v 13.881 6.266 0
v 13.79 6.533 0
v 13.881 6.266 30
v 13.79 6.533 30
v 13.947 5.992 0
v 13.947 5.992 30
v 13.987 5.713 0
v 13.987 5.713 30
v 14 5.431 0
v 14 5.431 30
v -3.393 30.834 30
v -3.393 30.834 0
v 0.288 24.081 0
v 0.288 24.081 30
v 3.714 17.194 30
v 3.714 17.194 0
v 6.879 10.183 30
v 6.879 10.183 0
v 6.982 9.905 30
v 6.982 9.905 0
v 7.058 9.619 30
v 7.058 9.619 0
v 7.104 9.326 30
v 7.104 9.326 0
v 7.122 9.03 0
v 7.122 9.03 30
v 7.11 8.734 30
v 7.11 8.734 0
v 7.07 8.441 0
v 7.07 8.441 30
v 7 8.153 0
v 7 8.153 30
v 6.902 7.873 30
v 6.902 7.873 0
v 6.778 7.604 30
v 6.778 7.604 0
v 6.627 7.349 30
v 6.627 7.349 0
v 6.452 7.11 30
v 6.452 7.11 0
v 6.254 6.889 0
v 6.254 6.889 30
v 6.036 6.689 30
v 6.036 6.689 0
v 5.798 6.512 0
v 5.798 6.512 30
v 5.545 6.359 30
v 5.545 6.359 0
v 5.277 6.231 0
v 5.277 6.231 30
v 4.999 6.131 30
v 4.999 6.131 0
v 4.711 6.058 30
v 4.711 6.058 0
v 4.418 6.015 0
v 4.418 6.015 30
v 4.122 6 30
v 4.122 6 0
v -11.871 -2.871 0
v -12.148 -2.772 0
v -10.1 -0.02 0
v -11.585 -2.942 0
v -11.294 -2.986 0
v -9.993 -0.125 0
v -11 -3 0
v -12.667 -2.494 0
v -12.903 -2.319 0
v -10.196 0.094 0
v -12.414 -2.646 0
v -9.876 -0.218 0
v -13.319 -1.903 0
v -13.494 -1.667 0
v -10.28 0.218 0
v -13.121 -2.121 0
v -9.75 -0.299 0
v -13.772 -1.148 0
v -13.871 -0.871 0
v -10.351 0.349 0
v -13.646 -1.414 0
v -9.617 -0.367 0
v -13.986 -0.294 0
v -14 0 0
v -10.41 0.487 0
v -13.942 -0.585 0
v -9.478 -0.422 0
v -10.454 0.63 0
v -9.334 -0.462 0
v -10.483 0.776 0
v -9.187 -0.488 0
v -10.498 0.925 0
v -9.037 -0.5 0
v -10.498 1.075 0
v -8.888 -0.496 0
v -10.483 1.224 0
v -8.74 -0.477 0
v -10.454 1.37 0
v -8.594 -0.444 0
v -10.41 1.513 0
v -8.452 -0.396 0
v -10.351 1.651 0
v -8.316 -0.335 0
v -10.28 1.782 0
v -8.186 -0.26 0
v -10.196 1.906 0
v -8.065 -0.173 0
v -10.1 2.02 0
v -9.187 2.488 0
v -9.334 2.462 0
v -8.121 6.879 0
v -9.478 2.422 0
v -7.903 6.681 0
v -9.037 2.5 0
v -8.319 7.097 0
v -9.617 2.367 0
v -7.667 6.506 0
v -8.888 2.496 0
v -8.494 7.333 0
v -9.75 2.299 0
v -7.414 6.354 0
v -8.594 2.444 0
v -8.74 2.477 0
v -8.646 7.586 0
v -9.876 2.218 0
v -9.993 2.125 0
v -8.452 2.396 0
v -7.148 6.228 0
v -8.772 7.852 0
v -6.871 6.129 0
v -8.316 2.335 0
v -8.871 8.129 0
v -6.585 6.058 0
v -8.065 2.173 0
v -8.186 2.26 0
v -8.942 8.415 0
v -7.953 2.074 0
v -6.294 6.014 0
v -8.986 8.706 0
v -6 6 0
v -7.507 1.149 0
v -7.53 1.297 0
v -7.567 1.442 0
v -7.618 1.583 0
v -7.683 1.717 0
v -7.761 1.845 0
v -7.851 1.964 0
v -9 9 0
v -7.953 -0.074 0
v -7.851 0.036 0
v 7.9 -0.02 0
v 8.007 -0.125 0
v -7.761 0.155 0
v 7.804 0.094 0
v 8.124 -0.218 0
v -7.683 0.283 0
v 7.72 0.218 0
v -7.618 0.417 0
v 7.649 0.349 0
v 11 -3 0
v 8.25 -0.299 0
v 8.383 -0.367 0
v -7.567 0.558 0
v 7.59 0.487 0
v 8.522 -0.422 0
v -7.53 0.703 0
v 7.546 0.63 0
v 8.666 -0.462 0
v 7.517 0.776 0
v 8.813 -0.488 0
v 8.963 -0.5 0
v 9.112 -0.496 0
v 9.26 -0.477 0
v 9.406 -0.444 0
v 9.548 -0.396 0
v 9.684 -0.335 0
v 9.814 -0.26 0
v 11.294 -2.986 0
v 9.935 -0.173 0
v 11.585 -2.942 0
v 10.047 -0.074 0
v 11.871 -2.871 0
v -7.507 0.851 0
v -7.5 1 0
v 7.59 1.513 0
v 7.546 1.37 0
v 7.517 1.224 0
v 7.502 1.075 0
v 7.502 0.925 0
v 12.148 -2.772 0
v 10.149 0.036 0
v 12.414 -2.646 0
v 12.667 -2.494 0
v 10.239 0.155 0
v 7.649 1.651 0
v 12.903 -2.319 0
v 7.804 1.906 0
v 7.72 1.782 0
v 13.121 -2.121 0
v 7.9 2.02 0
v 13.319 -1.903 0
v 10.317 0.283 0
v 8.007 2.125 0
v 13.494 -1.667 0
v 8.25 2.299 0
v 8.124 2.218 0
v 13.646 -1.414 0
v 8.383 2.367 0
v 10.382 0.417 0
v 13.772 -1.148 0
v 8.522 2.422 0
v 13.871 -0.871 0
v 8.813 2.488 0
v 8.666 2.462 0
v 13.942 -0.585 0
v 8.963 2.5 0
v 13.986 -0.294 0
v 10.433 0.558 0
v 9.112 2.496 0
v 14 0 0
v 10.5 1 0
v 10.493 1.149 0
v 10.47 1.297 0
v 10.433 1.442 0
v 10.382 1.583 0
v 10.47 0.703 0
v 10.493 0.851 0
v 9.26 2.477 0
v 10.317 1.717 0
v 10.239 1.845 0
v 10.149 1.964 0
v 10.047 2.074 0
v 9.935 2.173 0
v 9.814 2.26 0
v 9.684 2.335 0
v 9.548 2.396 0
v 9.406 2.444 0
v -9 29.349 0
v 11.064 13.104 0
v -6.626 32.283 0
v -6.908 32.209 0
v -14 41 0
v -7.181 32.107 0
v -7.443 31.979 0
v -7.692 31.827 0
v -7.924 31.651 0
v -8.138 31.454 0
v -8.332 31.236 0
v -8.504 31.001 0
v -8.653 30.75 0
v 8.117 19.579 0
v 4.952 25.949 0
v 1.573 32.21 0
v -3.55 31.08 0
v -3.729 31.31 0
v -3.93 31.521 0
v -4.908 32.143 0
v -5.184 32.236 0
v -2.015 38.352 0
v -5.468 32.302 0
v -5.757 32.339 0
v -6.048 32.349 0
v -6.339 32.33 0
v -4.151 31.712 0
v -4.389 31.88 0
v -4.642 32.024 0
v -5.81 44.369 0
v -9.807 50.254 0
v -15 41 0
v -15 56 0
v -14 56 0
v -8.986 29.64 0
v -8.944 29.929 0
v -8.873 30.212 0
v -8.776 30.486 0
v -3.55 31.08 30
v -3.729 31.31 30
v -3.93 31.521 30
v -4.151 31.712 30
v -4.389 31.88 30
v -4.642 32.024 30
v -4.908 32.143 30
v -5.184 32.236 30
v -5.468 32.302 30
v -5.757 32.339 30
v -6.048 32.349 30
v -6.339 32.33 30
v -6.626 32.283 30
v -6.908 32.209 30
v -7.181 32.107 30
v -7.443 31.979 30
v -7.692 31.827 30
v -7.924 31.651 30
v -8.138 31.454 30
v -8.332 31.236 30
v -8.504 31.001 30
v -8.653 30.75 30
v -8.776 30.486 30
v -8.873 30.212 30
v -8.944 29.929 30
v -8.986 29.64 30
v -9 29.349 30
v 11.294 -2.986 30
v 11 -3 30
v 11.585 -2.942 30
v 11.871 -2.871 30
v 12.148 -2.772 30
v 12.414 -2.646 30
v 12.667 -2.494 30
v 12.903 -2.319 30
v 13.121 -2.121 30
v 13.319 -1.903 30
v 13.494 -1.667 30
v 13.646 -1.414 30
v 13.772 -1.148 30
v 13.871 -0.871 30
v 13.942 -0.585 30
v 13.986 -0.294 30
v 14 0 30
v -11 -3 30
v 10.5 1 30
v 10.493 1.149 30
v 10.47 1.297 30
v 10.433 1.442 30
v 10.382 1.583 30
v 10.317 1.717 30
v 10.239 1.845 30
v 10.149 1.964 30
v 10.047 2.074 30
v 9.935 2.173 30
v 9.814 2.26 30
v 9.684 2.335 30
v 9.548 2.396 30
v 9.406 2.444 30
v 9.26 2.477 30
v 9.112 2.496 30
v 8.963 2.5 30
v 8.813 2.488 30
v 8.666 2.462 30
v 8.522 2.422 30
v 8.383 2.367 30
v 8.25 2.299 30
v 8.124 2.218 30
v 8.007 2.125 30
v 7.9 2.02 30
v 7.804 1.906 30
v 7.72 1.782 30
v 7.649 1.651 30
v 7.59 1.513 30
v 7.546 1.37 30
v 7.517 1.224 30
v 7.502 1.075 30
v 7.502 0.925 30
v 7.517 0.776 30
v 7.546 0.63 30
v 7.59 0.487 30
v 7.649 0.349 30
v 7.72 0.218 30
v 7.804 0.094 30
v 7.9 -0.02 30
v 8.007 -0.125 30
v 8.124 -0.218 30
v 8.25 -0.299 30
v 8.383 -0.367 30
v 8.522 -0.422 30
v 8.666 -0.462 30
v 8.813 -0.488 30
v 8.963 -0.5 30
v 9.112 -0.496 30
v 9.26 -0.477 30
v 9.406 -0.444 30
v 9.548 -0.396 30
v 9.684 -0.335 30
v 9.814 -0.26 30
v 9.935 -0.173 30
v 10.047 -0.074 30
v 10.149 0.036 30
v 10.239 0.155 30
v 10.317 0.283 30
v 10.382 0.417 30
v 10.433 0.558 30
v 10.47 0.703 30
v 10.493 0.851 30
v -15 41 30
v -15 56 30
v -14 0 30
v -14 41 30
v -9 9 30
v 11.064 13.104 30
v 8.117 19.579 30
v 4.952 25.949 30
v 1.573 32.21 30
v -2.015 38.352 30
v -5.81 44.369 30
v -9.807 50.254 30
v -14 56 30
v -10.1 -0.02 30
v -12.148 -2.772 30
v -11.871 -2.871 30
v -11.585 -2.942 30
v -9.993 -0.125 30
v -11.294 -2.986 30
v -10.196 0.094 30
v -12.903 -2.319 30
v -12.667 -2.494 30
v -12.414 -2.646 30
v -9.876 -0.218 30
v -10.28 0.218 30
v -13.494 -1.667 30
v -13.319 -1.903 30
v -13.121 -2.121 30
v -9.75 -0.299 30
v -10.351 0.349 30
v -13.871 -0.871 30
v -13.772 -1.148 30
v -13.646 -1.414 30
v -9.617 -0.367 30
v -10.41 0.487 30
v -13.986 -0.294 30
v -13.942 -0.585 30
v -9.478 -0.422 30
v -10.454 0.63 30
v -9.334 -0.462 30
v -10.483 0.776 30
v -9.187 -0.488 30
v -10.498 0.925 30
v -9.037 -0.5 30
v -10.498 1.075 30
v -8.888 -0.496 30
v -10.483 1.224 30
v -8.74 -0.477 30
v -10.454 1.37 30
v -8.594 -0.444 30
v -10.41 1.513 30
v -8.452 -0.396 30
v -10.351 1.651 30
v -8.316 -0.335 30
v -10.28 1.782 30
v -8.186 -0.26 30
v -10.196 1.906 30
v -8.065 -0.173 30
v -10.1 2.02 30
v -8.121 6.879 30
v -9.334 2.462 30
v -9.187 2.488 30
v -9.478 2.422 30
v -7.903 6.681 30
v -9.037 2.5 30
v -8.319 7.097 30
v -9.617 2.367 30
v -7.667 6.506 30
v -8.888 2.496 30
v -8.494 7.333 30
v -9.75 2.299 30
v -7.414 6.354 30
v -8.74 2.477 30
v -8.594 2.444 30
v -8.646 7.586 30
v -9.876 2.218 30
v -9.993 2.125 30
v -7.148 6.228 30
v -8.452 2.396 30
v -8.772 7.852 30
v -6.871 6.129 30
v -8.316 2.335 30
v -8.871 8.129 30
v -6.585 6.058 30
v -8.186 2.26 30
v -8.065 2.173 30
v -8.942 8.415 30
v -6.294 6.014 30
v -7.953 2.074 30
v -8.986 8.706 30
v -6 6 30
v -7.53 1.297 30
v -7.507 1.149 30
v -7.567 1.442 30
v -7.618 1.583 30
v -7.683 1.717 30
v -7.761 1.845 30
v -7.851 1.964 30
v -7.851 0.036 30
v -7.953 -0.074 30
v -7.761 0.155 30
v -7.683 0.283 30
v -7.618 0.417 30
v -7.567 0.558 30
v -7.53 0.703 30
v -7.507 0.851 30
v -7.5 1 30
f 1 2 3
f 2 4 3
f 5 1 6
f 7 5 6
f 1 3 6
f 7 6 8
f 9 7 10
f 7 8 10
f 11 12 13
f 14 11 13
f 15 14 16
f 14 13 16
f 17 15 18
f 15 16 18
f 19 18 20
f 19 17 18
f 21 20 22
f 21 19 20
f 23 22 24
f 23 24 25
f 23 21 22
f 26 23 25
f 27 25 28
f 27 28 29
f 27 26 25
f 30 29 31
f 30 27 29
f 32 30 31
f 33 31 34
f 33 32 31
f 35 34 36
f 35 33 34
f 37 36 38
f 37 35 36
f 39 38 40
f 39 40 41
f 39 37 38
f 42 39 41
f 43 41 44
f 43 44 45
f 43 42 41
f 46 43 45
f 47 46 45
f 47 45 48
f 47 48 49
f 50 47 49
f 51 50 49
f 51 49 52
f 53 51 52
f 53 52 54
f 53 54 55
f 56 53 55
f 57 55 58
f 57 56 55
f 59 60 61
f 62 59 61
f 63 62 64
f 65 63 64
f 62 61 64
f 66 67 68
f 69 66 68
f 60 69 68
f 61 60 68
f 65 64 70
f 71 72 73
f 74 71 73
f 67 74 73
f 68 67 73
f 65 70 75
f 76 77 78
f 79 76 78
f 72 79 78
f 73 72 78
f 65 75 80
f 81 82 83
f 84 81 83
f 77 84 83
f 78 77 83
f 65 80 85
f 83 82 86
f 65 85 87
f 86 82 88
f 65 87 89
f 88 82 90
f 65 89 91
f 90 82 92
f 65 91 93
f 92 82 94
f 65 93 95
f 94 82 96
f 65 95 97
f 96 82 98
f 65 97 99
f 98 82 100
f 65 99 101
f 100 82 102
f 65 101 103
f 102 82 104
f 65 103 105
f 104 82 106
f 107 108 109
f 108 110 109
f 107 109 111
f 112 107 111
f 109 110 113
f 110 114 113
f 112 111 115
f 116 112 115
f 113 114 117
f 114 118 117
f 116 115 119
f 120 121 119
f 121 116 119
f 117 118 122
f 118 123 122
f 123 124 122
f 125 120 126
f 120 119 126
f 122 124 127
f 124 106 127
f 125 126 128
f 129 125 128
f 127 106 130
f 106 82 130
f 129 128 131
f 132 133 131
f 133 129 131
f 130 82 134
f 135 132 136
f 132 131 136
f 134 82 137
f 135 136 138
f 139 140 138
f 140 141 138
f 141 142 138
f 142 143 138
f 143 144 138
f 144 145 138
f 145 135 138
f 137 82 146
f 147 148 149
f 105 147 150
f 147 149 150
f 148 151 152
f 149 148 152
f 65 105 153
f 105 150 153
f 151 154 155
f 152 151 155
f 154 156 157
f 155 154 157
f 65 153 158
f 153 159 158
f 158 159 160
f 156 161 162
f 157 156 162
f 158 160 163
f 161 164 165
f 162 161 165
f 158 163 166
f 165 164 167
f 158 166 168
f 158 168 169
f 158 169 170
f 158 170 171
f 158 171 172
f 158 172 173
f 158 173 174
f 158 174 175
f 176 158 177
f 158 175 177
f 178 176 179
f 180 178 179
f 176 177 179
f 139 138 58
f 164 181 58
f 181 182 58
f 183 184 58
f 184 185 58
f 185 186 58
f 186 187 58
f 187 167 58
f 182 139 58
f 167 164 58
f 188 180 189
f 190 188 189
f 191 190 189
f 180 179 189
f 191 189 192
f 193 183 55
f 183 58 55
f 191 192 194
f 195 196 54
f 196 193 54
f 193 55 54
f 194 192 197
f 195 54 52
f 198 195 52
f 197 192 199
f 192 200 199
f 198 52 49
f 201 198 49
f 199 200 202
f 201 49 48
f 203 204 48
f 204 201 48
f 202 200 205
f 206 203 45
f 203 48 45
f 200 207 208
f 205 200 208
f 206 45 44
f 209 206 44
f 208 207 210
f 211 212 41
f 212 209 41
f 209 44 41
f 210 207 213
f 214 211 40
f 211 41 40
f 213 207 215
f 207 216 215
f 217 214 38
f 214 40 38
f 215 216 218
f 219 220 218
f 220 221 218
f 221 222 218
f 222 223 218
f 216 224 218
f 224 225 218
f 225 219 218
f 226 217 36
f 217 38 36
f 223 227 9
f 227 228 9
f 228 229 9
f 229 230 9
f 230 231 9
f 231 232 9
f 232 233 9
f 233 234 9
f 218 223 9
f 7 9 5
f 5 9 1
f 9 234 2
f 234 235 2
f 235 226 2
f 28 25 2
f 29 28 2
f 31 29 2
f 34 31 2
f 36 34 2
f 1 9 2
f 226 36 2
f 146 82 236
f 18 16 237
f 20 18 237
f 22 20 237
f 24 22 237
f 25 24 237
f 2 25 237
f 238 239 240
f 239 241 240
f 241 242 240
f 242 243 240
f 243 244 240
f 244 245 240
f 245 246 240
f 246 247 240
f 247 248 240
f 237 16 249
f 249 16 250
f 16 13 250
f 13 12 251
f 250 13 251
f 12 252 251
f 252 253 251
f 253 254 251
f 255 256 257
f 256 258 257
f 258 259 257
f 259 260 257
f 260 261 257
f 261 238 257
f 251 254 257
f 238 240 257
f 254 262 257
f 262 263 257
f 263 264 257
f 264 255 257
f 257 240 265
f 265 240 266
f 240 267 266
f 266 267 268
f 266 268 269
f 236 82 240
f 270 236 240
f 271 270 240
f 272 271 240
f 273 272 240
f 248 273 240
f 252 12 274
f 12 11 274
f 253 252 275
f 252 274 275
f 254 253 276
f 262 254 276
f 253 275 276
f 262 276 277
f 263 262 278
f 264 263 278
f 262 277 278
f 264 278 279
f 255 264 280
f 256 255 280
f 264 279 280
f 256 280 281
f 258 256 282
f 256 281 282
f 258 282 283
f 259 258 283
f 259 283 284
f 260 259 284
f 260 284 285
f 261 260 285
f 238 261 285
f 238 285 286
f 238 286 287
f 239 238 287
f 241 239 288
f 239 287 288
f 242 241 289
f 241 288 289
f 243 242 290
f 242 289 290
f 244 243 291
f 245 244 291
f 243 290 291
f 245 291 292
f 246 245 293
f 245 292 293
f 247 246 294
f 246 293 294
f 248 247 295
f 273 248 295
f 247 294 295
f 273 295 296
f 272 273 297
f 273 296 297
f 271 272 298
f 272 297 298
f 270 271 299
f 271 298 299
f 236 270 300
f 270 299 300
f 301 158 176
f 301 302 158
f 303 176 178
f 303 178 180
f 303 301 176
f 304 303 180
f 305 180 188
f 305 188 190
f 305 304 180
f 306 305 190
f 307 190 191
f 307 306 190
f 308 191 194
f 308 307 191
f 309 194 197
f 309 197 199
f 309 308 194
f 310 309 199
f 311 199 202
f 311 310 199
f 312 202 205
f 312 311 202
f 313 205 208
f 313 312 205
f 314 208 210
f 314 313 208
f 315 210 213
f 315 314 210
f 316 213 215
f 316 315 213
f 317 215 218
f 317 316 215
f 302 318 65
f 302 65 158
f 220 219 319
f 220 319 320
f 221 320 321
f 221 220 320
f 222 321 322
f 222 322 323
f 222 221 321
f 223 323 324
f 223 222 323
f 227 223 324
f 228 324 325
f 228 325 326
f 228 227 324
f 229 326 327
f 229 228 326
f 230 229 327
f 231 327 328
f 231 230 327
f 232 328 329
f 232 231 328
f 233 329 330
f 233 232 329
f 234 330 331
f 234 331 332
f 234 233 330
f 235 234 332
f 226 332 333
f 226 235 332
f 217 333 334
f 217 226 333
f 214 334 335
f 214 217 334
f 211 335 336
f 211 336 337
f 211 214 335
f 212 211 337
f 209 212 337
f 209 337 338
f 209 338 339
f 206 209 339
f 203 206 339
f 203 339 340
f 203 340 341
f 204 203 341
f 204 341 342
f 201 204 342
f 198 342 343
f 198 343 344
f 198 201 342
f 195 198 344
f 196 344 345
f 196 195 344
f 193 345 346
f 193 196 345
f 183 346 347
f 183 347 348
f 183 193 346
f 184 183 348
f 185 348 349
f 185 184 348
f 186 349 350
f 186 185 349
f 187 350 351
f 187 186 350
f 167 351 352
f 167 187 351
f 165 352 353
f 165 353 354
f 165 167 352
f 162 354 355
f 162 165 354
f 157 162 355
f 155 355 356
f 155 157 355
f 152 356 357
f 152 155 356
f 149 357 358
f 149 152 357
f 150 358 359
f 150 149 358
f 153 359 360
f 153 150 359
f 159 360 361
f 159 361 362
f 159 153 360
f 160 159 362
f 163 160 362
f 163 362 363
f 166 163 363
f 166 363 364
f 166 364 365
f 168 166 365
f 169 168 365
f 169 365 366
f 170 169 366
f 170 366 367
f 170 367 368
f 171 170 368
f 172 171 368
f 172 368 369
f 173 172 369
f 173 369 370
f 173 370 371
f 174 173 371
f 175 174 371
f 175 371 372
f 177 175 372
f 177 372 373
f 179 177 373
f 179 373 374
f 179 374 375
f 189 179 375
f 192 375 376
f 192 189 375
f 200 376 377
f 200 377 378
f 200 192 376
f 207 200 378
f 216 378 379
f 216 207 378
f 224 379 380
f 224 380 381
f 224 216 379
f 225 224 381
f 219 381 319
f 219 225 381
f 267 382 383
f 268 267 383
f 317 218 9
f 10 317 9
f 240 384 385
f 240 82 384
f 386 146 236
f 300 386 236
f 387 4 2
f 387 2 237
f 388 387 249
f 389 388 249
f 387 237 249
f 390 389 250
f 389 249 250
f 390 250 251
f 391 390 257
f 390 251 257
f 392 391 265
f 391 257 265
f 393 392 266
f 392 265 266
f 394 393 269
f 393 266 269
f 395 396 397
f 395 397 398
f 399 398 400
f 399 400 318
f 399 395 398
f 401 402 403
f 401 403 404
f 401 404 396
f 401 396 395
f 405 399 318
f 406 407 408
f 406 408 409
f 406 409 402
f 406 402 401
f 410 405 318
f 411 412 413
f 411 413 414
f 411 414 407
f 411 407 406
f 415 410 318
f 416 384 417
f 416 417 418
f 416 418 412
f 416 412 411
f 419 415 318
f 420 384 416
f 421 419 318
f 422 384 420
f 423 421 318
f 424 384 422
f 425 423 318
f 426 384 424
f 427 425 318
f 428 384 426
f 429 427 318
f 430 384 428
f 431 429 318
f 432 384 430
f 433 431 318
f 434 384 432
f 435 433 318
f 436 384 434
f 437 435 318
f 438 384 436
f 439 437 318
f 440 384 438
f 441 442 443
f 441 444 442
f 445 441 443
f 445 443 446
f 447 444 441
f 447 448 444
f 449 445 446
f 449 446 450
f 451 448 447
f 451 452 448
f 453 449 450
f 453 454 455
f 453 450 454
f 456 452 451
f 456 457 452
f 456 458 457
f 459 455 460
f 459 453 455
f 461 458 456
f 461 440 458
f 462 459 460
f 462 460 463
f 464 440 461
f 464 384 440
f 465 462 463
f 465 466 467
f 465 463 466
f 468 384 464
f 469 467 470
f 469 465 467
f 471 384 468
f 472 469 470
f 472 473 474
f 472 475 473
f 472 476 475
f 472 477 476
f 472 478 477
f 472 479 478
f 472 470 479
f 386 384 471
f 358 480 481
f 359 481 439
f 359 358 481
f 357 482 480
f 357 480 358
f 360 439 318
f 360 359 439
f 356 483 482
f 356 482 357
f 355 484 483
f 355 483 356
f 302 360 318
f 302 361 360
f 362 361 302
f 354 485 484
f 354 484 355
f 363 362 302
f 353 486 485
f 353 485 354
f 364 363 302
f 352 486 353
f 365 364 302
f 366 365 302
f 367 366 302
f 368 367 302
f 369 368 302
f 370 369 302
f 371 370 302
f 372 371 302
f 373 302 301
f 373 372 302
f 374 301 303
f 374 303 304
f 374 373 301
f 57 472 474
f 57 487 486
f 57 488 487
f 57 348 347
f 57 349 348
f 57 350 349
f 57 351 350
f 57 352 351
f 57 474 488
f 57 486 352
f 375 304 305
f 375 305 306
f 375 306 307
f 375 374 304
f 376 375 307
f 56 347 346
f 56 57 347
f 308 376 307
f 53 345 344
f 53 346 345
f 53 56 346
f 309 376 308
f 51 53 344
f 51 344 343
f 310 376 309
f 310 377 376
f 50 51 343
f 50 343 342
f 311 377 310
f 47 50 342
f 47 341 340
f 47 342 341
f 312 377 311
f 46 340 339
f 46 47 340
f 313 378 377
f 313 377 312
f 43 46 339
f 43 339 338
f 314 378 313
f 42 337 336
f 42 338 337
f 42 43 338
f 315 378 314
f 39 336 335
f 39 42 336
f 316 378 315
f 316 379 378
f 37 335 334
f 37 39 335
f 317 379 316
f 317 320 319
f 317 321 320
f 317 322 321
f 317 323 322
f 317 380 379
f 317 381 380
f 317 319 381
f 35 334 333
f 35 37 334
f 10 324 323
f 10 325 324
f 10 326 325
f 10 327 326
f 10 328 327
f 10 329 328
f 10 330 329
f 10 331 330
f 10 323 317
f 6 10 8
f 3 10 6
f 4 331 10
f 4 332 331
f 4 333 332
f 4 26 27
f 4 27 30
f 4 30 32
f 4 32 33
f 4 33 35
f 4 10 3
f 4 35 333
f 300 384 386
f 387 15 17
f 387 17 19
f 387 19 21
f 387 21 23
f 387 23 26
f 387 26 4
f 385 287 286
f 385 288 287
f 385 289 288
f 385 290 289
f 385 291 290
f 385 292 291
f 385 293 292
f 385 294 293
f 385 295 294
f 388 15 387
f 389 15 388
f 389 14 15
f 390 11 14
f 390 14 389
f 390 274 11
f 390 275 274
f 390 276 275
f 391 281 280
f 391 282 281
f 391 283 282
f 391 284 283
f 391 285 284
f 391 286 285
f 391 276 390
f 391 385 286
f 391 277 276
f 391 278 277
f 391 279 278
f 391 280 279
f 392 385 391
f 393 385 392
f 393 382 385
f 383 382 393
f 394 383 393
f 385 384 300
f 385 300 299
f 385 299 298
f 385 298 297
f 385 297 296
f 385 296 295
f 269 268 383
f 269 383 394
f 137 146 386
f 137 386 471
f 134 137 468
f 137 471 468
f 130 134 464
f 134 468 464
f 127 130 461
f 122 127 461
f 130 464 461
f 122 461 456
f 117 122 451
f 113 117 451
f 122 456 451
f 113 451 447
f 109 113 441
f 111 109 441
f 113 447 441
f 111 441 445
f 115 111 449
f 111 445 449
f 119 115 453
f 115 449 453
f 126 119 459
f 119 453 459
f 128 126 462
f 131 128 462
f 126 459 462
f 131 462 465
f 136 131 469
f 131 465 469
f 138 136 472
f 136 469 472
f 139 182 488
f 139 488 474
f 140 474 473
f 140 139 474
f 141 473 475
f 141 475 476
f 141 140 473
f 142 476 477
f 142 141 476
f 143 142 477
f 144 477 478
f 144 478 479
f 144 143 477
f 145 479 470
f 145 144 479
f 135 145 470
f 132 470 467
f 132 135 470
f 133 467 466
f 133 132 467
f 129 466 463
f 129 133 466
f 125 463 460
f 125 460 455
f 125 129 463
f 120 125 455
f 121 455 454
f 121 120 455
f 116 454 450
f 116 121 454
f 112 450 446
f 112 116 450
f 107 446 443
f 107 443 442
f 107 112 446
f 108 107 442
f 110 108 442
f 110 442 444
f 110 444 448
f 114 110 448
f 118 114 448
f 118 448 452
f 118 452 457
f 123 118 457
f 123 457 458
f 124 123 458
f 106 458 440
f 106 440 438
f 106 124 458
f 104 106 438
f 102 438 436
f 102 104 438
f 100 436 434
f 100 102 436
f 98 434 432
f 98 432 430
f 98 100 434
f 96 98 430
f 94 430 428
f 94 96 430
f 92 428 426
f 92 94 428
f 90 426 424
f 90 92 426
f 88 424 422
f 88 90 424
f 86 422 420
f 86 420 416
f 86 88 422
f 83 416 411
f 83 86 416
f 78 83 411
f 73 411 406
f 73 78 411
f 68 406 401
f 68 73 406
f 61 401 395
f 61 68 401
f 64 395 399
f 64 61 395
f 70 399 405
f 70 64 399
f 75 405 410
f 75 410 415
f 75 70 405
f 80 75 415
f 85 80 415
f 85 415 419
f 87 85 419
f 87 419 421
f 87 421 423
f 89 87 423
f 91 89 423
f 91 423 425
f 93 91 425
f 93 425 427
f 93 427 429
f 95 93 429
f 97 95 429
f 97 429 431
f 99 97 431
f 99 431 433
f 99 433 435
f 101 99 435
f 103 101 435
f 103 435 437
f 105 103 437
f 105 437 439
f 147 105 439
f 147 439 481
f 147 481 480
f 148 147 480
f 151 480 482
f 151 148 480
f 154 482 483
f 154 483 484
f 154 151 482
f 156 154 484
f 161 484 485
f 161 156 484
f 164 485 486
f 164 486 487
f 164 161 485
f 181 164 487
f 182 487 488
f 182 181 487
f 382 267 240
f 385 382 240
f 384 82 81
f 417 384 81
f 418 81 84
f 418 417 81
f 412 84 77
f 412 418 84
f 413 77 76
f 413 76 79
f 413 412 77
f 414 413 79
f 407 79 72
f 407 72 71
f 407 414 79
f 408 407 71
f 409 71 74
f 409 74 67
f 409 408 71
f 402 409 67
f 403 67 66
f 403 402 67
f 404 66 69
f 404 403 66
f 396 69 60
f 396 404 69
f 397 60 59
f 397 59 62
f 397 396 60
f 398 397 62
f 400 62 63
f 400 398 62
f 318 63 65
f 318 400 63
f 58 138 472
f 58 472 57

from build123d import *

# Parameters (mm, degrees)
SKETCH_1_W          = 1
SKETCH_1_H          = 15
SKETCH_1_W_2        = 28
SKETCH_1_H_2        = 12
SKETCH_1_R          = 1.5
EXTRUDE_1_DEPTH     = 30
FILLET_1_R          = 3
CUT_EXTRUDE_1_DEPTH = 66.276335681
FILLET_2_R          = 3


with BuildPart() as part:
    # 草图1 → 凸台-拉伸1 (new body)
    # profile 1 of 3: a face of its own
    with BuildSketch(Plane.XY):
        with BuildLine():
            Line((-14, 41), (-14, 6))
            Line((-14, 6), (-9, 6))
            Line((-9, 6), (-9, 40.097477255))
            ThreePointArc((-9, 40.097477255), (0.609436103, 23.461990889), (8.619401339, 6))
            Line((8.619401339, 6), (14, 6))
            ThreePointArc((14, 6), (1.713554205, 31.959590355), (-14, 56))
            Line((-14, 56), (-14, 41))
        make_face()
    # profile 2 of 3: a face of its own
    with BuildSketch(Plane.XY):
        with Locations((-14.5, 48.5)):
            Rectangle(SKETCH_1_W, SKETCH_1_H)
    # profile 3 of 3: a face of its own
    with BuildSketch(Plane.XY):
        Rectangle(SKETCH_1_W_2, SKETCH_1_H_2)
        with Locations((-9, 1)):
            Circle(SKETCH_1_R, mode=Mode.SUBTRACT)
        with Locations((9, 1)):
            Circle(SKETCH_1_R, mode=Mode.SUBTRACT)
    extrude(amount=EXTRUDE_1_DEPTH)

    # 圆角1
    fillet_1_edges = [part.edges().sort_by_distance(p)[0] for p in [
        (-9, 6, 15),
        (8.619401339, 6, 15),
        (-9, 40.097477255, 15),
        (14, -6, 15),
        (-14, -6, 15),
    ]]
    fillet(fillet_1_edges, radius=FILLET_1_R)

    # 草图2 → 切除-拉伸1 (cut, through all)
    with BuildSketch(Plane.XY.offset(30)):
        with BuildLine():
            Line((-14, -3), (14, -3))
            ThreePointArc((14, -3), (13.121320344, -5.121320344), (11, -6))
            Line((11, -6), (-11, -6))
            ThreePointArc((-11, -6), (-13.121320344, -5.121320344), (-14, -3))
        make_face()
    extrude(amount=-CUT_EXTRUDE_1_DEPTH, mode=Mode.SUBTRACT)

    # 圆角2
    fillet_2_edges = [part.edges().sort_by_distance(p)[0] for p in [
        (14, 6, 15),
        (14, -3, 15),
        (-14, -3, 15),
    ]]
    fillet(fillet_2_edges, radius=FILLET_2_R)


solid = part.part
